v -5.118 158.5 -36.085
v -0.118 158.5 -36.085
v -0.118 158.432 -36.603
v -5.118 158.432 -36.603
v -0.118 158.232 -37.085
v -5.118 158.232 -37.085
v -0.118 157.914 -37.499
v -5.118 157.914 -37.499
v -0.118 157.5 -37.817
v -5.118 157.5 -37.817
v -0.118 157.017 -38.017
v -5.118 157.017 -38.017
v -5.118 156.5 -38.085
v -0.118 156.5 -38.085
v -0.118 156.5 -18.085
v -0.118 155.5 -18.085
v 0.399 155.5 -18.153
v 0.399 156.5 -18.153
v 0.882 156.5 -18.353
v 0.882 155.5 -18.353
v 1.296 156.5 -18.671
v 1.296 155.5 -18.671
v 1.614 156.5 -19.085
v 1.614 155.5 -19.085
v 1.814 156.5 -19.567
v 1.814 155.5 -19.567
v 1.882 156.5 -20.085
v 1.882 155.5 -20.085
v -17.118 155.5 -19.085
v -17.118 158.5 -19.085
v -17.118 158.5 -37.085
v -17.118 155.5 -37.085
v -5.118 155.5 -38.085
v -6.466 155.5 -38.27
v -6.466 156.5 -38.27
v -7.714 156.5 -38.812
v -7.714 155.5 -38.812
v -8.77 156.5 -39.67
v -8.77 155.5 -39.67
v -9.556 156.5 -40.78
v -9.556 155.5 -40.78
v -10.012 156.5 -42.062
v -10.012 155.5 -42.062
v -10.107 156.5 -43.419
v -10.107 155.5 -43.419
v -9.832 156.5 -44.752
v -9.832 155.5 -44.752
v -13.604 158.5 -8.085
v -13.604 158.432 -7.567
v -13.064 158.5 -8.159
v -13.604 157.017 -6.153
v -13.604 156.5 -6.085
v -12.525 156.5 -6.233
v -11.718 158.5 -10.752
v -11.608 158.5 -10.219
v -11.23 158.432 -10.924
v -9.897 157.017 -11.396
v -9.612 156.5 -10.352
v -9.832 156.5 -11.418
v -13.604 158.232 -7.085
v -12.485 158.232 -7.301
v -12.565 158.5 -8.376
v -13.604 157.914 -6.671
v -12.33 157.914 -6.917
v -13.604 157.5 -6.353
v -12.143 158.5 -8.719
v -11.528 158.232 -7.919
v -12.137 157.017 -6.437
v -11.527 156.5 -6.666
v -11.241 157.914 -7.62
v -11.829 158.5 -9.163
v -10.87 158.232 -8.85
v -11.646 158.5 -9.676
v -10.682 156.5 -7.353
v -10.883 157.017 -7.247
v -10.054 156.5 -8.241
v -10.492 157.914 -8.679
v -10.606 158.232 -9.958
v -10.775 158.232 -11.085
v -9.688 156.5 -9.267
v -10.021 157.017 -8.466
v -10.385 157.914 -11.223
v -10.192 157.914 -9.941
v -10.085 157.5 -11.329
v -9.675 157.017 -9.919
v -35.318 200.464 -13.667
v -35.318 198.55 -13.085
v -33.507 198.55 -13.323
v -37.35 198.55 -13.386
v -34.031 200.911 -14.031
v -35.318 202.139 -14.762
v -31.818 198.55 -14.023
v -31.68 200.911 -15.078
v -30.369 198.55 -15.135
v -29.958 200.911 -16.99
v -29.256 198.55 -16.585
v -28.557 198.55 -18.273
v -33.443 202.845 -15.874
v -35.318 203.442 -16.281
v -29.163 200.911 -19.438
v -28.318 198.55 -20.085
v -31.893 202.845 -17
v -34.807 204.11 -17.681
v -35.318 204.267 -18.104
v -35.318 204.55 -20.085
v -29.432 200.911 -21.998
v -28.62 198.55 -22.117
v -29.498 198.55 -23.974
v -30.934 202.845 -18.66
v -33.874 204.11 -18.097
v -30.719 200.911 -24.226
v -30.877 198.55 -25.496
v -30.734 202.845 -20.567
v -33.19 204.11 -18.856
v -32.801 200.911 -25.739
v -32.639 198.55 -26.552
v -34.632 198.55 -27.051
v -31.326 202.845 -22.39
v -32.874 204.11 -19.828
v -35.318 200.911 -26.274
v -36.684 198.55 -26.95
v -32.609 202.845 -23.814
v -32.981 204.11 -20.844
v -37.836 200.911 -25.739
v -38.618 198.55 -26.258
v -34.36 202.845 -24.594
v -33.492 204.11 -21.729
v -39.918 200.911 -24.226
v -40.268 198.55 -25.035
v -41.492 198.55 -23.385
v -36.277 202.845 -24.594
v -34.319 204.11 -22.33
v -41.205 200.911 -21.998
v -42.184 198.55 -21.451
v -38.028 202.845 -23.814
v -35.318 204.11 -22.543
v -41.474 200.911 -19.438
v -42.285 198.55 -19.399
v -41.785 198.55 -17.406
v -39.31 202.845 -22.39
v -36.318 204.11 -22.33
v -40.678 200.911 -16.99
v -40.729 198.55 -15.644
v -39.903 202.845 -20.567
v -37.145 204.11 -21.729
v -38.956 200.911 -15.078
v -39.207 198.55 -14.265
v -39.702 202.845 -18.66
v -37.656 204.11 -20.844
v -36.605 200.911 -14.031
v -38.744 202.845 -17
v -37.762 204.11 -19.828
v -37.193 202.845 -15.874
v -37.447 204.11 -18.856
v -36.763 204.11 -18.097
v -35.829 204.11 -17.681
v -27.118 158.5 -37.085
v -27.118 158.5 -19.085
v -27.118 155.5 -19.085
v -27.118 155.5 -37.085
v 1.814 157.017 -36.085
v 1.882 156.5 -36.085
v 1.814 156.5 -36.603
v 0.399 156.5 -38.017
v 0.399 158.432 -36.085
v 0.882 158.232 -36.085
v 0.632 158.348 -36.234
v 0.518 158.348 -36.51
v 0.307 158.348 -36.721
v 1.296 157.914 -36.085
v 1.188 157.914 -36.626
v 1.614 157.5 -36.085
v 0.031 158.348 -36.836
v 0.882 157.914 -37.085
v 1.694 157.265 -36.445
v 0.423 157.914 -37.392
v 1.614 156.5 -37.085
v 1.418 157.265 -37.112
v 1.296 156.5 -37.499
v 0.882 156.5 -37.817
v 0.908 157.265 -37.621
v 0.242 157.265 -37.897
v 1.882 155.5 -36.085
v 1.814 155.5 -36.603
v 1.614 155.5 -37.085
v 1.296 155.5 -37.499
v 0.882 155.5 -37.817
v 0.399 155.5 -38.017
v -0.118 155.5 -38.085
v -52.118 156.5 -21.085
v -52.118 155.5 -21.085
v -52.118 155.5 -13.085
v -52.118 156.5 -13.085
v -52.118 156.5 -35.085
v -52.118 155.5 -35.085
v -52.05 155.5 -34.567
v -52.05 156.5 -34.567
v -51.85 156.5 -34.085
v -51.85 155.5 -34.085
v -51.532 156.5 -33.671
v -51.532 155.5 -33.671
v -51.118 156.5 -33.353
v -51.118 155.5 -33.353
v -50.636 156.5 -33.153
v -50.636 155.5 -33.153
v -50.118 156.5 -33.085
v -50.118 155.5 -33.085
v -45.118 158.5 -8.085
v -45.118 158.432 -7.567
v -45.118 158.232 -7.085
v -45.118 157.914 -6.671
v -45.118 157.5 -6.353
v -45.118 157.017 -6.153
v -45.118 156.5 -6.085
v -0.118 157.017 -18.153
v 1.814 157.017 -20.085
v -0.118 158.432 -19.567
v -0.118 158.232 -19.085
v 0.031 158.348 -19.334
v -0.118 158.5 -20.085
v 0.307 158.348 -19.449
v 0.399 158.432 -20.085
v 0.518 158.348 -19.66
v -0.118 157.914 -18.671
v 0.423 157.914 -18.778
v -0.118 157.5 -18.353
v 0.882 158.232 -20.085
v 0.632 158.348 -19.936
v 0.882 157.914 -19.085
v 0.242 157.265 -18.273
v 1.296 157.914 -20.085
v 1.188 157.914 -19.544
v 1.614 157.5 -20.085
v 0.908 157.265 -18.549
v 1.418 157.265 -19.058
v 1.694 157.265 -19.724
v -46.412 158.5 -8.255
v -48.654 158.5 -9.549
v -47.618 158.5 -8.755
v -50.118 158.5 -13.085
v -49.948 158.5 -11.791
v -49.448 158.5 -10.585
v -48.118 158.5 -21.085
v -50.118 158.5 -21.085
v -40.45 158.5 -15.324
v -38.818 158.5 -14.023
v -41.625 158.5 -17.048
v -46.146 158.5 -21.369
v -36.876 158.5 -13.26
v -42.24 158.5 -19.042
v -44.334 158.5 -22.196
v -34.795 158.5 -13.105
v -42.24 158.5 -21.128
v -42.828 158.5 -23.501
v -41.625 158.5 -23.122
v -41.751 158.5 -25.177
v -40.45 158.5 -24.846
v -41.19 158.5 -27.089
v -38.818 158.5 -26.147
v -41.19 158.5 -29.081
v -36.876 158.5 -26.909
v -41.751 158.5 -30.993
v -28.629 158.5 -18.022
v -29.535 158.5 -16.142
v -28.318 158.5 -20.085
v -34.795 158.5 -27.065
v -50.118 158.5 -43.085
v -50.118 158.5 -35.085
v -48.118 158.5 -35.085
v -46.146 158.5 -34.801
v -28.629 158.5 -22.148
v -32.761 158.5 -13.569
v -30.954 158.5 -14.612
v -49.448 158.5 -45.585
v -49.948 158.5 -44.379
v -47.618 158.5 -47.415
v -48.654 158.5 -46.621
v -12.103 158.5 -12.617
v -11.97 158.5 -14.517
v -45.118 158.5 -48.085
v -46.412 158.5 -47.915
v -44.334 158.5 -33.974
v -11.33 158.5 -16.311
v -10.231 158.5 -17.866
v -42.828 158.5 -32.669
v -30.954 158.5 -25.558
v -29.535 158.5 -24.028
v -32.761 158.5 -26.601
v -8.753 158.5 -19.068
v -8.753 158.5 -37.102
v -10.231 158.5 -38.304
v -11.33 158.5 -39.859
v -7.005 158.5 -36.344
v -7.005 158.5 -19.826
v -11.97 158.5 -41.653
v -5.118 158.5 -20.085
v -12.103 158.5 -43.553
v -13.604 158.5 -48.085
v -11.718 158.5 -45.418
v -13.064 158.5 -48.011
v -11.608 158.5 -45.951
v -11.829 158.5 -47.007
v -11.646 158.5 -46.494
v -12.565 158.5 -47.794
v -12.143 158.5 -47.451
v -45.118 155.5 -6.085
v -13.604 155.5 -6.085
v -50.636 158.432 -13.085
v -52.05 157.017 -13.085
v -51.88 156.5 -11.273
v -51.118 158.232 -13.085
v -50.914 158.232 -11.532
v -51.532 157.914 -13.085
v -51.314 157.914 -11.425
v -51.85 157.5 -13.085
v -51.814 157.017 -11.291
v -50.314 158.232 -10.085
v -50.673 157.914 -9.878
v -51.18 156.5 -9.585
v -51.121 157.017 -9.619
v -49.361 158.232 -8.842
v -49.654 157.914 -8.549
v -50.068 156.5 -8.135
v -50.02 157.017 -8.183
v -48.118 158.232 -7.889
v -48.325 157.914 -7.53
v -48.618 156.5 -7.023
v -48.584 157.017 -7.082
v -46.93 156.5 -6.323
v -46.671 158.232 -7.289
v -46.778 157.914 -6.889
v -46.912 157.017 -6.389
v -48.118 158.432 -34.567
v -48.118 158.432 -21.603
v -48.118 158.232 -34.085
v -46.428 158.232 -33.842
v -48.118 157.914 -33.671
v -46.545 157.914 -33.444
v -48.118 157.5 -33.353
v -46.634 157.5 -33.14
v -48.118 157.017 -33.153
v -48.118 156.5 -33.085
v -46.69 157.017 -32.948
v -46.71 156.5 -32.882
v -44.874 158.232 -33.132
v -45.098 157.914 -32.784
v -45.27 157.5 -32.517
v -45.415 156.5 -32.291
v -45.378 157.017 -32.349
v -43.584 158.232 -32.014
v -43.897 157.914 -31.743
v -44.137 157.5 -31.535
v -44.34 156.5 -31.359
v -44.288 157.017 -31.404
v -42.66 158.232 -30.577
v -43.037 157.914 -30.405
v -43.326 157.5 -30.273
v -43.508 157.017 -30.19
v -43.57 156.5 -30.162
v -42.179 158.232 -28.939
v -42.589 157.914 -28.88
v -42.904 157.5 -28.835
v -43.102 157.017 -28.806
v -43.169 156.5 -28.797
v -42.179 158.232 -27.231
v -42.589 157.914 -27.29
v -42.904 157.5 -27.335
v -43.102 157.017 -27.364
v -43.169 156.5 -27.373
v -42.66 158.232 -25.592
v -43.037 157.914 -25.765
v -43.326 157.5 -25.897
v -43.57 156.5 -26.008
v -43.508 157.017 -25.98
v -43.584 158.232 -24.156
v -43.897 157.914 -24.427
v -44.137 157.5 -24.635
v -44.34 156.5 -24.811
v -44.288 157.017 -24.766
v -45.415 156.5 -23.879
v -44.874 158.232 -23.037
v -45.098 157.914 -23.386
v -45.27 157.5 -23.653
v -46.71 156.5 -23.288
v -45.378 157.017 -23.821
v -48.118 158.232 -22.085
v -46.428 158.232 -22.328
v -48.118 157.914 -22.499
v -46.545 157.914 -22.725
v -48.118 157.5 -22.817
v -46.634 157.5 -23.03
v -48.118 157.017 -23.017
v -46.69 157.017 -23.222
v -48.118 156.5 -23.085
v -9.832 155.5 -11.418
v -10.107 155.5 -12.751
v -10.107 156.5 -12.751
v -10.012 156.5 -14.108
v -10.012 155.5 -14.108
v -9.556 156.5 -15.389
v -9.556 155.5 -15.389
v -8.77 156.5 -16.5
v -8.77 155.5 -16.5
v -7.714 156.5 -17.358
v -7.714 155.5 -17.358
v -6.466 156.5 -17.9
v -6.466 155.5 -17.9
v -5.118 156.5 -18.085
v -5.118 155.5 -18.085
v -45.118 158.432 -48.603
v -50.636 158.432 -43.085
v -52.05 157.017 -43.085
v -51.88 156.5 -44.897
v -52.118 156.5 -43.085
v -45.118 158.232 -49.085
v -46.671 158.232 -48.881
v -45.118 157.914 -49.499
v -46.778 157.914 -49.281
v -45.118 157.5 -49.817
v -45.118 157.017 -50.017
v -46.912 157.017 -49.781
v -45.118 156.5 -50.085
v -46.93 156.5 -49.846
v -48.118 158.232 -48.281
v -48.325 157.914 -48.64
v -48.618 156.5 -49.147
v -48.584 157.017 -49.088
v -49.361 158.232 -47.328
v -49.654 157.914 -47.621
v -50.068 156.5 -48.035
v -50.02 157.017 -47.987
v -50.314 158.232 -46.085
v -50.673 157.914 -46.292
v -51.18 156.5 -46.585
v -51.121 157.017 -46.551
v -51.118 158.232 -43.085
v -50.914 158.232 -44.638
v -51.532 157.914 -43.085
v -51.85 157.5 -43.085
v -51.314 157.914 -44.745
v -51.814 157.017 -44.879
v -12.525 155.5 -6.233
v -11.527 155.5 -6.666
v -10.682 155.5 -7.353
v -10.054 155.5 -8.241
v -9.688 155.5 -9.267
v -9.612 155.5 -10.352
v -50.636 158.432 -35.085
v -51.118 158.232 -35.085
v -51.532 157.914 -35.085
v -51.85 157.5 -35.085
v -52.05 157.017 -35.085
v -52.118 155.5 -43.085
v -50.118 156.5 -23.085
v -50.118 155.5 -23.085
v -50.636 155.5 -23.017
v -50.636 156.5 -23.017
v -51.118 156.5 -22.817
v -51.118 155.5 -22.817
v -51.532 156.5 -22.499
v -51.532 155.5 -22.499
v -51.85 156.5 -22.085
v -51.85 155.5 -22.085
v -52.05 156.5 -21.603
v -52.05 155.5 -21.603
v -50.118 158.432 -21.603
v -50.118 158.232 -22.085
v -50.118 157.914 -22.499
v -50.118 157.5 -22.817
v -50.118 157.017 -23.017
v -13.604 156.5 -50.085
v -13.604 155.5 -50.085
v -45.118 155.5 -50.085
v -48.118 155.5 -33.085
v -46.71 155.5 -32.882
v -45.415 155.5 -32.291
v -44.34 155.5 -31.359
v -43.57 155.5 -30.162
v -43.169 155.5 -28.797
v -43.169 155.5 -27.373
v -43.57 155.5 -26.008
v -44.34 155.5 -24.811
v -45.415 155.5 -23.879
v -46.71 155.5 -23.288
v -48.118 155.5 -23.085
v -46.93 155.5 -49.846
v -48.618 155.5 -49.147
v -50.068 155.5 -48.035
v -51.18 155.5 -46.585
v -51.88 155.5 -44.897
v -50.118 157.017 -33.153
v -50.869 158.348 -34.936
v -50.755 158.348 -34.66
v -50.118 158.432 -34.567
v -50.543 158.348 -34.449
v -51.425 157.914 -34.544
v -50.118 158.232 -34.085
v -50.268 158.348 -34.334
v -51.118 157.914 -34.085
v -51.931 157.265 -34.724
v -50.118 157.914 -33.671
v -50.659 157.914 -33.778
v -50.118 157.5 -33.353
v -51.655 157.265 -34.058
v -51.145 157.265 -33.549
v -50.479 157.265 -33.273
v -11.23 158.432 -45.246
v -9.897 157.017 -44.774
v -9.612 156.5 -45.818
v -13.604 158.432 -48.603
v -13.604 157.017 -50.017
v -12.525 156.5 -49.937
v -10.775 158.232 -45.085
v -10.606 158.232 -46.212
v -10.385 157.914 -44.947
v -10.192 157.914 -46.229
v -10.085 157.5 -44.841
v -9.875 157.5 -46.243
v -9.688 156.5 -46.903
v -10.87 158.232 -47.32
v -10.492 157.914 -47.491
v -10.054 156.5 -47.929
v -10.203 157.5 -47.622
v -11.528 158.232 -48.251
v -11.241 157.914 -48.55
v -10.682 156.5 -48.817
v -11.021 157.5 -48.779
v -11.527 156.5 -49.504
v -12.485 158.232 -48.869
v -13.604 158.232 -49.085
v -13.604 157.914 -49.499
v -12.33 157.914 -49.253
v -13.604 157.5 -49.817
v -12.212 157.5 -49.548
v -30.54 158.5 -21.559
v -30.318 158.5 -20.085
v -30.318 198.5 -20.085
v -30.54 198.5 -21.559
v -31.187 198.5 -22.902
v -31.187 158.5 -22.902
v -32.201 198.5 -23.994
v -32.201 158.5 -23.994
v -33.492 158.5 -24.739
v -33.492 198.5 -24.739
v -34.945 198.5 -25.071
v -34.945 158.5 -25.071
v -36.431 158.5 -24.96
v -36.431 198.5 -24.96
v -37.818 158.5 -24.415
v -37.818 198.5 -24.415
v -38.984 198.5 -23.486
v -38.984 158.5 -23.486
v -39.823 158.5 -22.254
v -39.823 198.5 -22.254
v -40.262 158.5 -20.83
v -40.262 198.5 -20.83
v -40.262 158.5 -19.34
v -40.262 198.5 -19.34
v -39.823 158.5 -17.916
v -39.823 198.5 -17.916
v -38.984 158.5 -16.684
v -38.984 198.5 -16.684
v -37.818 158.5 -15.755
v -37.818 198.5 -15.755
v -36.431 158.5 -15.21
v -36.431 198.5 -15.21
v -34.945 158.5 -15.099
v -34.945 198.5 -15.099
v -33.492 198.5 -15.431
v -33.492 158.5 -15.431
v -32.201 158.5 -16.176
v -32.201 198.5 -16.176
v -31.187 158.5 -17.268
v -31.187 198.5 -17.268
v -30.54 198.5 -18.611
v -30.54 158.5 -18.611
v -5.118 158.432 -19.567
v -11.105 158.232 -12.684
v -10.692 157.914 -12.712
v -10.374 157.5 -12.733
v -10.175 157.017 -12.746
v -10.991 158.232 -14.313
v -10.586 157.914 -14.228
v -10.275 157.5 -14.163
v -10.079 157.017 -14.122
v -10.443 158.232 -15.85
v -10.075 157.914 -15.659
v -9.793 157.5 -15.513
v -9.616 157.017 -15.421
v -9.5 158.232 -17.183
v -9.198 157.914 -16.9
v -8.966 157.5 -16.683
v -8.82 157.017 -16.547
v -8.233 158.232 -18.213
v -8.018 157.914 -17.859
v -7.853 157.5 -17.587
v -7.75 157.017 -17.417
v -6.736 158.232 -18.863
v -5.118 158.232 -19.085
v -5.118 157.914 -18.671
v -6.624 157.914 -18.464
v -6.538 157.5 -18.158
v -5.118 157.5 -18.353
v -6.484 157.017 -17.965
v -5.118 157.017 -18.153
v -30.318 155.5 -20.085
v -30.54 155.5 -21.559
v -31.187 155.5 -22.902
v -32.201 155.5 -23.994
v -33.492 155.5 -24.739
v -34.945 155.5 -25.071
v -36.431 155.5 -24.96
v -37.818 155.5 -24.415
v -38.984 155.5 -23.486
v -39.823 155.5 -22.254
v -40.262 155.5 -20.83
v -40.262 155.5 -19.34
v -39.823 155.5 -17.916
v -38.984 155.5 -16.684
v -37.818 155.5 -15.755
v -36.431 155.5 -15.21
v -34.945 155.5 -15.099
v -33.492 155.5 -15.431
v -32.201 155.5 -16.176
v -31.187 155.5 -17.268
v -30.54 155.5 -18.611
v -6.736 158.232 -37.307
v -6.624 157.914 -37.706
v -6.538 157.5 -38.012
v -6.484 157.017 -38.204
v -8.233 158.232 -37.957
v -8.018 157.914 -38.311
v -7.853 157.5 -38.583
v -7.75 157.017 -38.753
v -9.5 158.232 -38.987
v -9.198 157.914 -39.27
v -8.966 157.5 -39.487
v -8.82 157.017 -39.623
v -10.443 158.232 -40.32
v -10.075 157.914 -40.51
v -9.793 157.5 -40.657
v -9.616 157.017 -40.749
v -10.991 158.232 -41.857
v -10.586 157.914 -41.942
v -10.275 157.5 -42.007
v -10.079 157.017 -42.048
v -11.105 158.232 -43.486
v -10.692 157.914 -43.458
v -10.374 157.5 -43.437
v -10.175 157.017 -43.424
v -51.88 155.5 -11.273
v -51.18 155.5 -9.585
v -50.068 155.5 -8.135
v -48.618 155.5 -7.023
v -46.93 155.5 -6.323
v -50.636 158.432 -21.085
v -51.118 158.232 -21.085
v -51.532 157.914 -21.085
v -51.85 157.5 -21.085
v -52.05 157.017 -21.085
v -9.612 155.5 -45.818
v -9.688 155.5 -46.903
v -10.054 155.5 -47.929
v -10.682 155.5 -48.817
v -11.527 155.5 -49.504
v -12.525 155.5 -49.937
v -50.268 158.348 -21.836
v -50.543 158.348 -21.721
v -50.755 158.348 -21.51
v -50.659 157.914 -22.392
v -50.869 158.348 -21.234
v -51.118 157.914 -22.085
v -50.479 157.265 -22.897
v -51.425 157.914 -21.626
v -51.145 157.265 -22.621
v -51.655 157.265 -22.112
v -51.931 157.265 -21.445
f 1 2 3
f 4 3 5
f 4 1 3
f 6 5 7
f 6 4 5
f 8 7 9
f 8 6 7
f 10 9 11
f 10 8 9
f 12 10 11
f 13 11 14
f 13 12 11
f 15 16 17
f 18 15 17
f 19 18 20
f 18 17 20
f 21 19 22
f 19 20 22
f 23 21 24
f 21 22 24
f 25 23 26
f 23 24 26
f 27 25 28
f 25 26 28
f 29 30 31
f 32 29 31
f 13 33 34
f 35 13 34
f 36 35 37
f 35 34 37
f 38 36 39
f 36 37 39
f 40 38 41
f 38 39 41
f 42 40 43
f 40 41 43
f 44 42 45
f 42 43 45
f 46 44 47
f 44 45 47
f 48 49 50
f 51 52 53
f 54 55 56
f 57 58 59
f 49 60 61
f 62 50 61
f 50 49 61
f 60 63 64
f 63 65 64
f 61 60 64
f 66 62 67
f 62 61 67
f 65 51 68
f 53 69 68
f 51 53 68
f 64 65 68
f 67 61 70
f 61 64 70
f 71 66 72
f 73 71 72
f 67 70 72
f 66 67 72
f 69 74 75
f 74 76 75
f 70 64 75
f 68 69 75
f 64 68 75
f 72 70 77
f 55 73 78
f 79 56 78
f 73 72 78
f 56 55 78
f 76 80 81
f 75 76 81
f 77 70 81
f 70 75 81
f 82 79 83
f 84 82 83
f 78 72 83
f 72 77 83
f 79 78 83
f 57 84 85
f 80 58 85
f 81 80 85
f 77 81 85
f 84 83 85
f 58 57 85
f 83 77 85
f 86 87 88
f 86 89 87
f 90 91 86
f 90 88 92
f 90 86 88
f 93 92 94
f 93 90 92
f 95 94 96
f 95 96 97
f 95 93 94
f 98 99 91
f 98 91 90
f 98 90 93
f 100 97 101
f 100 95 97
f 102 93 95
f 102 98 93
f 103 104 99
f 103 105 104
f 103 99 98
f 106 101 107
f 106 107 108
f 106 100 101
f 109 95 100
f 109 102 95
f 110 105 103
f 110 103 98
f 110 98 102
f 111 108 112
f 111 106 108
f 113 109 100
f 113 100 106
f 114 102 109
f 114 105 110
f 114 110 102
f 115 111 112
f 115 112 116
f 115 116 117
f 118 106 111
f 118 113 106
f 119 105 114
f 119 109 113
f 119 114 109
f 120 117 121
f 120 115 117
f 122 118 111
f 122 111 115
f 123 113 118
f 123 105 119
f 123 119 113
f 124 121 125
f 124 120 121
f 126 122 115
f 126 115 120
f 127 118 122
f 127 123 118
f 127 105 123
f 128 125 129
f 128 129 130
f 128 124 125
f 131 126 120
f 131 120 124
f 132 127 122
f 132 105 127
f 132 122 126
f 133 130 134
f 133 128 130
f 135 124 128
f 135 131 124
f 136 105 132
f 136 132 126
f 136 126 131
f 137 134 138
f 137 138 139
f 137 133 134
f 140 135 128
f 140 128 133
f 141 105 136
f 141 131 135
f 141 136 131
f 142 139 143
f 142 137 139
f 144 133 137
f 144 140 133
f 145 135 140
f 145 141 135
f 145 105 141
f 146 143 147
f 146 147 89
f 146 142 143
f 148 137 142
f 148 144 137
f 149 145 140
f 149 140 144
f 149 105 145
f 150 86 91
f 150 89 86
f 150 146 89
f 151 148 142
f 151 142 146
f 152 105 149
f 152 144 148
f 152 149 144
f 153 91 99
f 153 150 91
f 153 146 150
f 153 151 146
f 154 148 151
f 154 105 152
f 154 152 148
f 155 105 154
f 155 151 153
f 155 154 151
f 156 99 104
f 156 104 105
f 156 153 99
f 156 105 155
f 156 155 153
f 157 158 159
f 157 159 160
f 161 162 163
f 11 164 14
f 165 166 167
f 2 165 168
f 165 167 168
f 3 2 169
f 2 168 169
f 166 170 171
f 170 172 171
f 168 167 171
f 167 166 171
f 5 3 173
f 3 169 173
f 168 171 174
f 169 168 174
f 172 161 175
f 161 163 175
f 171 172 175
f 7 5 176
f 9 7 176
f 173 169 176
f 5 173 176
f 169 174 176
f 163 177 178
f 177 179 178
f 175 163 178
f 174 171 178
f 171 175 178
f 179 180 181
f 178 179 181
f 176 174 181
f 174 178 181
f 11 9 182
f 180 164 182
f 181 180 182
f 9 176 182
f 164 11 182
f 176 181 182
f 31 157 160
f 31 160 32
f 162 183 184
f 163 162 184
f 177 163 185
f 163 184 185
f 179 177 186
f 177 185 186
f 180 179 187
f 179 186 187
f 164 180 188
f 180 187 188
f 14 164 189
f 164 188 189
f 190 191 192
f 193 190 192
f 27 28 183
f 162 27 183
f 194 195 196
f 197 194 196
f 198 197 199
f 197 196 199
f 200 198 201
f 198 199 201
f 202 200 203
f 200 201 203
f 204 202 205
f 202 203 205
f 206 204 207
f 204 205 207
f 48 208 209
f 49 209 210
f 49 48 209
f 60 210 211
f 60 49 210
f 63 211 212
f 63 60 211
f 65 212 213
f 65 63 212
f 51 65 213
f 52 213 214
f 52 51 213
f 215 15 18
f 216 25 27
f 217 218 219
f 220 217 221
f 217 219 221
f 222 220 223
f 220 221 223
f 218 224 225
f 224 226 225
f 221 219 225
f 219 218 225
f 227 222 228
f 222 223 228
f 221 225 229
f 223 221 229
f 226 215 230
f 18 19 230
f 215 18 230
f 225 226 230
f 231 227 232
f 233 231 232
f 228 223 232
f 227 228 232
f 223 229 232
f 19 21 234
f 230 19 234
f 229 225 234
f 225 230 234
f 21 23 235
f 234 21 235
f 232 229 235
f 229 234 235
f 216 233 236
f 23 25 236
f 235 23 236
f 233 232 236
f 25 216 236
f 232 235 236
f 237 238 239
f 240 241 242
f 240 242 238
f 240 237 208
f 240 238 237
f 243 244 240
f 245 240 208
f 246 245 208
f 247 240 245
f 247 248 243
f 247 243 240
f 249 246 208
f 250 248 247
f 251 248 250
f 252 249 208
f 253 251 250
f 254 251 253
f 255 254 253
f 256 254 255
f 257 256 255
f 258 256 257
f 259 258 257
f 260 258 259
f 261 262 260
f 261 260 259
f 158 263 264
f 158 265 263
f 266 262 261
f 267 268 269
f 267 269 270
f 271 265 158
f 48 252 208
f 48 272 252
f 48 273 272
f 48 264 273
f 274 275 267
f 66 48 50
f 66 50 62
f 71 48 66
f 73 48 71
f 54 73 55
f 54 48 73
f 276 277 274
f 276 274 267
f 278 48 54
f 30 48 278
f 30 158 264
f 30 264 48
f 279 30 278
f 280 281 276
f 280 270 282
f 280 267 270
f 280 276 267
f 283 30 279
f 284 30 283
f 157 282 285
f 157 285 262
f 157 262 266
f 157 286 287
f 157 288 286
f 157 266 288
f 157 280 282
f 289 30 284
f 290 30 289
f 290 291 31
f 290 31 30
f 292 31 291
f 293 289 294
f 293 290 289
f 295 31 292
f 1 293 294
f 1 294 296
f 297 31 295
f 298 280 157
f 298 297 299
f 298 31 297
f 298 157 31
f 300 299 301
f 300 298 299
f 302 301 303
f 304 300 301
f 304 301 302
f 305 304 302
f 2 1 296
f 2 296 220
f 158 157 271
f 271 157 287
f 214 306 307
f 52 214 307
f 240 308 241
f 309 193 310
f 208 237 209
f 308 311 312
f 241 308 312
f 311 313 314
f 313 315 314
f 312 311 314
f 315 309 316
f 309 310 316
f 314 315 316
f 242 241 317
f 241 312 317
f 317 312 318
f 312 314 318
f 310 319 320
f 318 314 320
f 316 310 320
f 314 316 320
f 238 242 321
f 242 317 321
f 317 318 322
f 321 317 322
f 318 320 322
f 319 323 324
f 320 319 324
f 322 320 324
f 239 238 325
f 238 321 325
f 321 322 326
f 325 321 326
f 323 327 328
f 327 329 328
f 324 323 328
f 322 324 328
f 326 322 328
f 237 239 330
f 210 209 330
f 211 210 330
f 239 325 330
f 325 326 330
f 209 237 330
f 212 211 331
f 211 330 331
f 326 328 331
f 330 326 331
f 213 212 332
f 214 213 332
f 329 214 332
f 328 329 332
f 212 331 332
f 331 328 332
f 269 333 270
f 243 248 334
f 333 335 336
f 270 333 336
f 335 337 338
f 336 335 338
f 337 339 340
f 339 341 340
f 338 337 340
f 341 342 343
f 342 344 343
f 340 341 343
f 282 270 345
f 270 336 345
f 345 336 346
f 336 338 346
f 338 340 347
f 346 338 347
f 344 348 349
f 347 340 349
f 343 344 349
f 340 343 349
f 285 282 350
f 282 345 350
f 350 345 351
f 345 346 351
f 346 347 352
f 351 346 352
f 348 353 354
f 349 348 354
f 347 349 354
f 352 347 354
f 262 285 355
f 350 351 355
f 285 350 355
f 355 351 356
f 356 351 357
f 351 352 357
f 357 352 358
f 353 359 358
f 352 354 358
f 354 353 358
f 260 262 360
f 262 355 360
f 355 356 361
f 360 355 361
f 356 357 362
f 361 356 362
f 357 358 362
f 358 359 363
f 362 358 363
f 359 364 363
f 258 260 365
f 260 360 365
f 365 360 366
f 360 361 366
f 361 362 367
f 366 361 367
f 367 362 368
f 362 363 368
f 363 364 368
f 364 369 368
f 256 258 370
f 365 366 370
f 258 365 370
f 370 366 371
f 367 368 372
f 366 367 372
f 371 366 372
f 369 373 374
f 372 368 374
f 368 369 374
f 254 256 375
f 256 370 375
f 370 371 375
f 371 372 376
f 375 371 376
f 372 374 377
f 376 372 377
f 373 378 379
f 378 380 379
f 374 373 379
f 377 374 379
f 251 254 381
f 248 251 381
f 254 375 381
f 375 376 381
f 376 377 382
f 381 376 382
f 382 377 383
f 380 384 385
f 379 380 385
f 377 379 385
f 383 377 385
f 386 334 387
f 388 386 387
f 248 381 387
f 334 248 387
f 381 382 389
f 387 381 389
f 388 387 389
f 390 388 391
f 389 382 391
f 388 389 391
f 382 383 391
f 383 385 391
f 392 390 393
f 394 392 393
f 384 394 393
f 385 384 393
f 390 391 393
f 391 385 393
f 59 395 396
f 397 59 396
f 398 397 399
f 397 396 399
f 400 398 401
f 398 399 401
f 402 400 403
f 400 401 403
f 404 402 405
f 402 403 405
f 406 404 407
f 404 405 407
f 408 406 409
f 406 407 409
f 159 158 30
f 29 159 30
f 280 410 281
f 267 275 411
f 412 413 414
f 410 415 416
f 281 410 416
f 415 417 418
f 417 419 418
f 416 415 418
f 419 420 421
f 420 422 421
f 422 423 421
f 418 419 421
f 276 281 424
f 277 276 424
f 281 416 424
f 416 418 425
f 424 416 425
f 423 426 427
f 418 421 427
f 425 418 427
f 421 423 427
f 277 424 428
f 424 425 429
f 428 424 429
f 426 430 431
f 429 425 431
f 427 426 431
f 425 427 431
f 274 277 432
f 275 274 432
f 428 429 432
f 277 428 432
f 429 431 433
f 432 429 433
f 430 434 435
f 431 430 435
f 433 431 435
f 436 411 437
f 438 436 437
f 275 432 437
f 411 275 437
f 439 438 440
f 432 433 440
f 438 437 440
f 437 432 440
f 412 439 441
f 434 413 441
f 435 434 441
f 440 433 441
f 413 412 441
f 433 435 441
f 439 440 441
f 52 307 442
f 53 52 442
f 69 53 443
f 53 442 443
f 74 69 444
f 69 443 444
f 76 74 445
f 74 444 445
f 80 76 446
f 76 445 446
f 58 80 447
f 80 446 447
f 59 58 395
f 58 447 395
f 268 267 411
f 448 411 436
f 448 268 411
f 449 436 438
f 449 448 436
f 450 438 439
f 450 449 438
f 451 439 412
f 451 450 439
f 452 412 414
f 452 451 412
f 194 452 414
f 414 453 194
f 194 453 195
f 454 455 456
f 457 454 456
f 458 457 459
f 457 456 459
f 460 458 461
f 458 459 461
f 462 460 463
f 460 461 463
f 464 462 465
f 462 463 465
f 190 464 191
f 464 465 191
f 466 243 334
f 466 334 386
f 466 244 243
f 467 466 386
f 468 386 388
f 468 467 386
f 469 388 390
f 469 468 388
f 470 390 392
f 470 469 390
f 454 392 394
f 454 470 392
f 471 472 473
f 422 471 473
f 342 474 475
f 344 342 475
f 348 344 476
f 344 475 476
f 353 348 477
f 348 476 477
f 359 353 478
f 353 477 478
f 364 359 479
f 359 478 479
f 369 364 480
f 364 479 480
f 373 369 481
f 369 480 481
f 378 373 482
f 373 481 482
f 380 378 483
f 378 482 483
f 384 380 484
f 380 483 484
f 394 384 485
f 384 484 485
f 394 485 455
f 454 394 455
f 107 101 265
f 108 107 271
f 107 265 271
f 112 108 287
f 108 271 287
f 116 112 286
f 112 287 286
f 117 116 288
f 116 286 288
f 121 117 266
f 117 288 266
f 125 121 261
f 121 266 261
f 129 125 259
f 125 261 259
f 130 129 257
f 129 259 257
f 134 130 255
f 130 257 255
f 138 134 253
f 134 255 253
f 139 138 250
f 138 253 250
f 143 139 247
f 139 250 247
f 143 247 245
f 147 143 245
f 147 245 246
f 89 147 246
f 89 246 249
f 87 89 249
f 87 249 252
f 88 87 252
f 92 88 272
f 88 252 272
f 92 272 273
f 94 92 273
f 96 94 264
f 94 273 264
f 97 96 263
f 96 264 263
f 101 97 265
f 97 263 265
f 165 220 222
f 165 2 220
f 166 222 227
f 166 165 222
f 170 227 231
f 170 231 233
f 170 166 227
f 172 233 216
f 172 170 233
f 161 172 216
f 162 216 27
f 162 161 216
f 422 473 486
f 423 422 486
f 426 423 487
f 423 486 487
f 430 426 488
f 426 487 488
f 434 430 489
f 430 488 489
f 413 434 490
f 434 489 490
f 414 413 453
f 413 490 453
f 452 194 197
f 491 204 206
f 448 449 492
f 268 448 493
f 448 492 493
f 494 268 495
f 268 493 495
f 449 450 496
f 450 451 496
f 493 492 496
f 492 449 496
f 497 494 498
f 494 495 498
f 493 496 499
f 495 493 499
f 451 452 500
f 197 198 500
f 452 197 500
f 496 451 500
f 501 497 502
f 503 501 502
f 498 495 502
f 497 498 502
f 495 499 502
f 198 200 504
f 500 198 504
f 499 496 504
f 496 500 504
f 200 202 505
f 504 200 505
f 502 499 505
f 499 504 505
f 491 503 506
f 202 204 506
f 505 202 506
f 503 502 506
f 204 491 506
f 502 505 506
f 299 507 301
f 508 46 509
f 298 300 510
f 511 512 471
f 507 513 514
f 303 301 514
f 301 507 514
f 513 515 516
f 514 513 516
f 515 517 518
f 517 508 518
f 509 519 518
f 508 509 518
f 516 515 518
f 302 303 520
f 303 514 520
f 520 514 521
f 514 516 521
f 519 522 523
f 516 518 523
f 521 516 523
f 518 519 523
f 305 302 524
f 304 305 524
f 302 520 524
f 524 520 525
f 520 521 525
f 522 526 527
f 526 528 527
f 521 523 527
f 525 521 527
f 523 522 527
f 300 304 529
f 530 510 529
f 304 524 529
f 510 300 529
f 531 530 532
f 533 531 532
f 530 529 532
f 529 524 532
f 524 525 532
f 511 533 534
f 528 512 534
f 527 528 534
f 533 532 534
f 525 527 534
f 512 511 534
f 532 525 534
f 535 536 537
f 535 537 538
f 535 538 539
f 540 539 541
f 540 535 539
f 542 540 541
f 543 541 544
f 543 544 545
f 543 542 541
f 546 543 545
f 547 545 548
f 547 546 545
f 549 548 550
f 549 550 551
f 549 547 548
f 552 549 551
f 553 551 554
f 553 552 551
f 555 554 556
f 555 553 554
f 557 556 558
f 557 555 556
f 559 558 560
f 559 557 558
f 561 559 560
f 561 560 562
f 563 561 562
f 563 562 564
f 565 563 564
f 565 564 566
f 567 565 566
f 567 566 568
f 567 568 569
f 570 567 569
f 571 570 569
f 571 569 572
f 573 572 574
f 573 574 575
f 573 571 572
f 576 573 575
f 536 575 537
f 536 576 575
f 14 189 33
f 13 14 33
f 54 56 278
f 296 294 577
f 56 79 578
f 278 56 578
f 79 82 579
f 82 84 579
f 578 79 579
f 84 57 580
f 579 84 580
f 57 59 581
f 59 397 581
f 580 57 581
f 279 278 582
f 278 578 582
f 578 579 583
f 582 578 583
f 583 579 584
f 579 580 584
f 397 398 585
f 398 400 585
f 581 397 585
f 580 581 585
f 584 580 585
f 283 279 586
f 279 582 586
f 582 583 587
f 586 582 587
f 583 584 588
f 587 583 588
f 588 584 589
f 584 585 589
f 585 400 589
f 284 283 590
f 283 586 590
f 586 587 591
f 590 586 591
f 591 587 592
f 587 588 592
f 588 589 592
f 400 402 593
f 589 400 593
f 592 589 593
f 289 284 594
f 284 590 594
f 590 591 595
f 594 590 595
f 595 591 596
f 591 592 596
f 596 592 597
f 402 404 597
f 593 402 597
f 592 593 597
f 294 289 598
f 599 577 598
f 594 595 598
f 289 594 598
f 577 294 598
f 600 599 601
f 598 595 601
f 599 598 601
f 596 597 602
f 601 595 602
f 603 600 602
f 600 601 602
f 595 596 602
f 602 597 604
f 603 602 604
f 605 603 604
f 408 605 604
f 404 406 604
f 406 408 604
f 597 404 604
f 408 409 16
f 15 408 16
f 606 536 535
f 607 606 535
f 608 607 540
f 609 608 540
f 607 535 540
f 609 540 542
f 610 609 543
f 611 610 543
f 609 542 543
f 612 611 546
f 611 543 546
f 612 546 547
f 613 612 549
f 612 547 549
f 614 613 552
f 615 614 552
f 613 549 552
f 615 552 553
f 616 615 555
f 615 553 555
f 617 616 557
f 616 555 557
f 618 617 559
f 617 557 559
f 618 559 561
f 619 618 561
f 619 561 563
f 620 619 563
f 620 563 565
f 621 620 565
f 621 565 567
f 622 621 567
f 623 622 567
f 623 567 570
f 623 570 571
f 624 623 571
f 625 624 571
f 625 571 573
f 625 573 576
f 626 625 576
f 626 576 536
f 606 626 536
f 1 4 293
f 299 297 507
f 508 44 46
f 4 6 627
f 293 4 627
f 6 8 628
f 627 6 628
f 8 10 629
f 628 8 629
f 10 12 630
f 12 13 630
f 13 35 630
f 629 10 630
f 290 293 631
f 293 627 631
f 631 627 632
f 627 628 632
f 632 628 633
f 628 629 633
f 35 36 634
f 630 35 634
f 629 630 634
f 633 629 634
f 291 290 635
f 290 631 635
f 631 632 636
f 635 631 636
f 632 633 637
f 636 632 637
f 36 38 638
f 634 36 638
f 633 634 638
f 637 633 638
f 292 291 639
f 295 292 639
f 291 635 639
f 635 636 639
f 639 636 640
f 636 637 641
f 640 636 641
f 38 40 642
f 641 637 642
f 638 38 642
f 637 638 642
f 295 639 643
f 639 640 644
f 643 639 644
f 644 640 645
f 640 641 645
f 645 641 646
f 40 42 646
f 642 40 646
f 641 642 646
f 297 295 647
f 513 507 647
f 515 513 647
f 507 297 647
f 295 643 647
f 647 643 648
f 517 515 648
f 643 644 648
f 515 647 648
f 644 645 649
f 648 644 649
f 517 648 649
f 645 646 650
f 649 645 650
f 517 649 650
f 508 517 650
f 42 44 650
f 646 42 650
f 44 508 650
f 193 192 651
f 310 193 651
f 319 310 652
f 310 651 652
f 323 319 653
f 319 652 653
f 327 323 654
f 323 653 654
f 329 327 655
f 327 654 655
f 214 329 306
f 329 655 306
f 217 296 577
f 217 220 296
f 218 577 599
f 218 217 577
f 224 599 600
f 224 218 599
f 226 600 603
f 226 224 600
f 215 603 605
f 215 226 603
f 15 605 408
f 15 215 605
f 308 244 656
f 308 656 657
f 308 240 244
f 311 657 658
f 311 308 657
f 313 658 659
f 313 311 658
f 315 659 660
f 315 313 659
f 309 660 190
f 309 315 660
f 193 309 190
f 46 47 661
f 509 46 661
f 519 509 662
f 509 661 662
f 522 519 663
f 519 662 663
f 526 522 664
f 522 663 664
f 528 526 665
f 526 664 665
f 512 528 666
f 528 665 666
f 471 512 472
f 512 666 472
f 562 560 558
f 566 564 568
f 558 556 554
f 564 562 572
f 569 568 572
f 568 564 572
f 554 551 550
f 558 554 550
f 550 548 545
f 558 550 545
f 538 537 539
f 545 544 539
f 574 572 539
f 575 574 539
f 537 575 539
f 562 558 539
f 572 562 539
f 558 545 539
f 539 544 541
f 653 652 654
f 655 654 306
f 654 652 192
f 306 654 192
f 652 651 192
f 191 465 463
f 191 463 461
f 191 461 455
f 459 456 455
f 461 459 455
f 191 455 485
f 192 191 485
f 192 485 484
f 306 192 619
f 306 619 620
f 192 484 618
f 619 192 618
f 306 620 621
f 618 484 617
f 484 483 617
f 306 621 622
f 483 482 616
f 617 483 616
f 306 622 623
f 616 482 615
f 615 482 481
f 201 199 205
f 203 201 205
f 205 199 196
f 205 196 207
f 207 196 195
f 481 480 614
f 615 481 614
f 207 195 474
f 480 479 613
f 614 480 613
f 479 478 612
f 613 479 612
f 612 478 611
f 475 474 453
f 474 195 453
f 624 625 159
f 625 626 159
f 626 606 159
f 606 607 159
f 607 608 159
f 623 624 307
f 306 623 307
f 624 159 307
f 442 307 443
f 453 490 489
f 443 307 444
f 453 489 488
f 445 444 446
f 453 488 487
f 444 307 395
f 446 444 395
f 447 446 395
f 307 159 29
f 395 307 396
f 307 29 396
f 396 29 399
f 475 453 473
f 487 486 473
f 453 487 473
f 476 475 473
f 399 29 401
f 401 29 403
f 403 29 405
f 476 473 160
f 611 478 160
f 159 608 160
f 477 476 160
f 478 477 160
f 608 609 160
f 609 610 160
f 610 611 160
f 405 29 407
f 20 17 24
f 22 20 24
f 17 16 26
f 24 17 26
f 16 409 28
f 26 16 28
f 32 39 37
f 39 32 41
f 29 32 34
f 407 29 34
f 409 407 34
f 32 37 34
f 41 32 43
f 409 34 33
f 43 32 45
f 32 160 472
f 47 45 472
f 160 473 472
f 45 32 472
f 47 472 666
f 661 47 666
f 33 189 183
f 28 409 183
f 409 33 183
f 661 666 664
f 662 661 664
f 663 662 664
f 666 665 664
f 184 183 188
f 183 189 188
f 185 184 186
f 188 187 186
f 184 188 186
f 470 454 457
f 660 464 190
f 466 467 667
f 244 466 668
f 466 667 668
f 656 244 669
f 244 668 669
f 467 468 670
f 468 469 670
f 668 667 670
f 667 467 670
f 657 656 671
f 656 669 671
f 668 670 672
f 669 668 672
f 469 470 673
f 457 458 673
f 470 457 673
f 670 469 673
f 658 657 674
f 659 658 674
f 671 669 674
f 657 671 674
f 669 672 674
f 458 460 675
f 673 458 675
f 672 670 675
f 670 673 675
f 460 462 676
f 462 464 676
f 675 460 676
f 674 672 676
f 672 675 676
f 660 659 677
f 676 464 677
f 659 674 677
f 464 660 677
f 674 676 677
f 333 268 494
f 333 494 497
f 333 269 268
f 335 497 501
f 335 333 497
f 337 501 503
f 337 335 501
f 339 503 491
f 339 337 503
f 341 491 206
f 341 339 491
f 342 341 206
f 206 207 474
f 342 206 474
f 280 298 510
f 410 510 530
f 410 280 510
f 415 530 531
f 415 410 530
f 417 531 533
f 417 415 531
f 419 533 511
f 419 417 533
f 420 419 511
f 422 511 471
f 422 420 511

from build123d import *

# Parameters (mm, degrees)
SALIENTE_EXTRUIR1_DEPTH = 3
CORTAR_EXTRUIR1_REACH   = 5
CROQUIS2_W              = 10
CROQUIS2_H              = 18
CORTAR_EXTRUIR2_REACH   = 5
CROQUIS3_R              = 5
CROQUIS4_R              = 7
CROQUIS4_R_2            = 5
SALIENTE_EXTRUIR2_DEPTH = 40
CROQUIS5_R              = 7
SALIENTE_EXTRUIR3_DEPTH = 0.05
C_PULA1_FACE_RADIUS     = 7
C_PULA1_HEIGHT          = 6
REDONDEO1_R             = 2


with BuildPart() as part:
    # Croquis1 → Saliente-Extruir1 (new body)
    with BuildSketch(Plane(origin=(0, 155.4998128, 0), x_dir=(1, 0, 0), z_dir=(0, 1, 0))):
        with BuildLine():
            Line((1.881749032, 20.084971867), (1.881749032, 36.084971867))
            ThreePointArc((1.881749032, 36.084971867), (1.295962595, 37.499185429), (-0.118250968, 38.084971867))
            Line((-0.118250968, 38.084971867), (-5.118250968, 38.084971867))
            ThreePointArc((-5.118250968, 38.084971867), (-9.200733872, 40.198220521), (-9.832296176, 44.751638534))
            ThreePointArc((-9.832296176, 44.751638534), (-10.337546018, 48.394372944), (-13.603532342, 50.084971867))
            Line((-13.603532342, 50.084971867), (-45.118250968, 50.084971867))
            ThreePointArc((-45.118250968, 50.084971867), (-50.067998436, 48.034719335), (-52.118250968, 43.084971867))
            Line((-52.118250968, 43.084971867), (-52.118250968, 35.084971867))
            ThreePointArc((-52.118250968, 35.084971867), (-51.53246453, 33.670758305), (-50.118250968, 33.084971867))
            Line((-50.118250968, 33.084971867), (-48.118250968, 33.084971867))
            ThreePointArc((-48.118250968, 33.084971867), (-43.118250968, 28.084971867), (-48.118250968, 23.084971867))
            Line((-48.118250968, 23.084971867), (-50.118250968, 23.084971867))
            ThreePointArc((-50.118250968, 23.084971867), (-51.53246453, 22.499185429), (-52.118250968, 21.084971867))
            Line((-52.118250968, 21.084971867), (-52.118250968, 13.084971867))
            ThreePointArc((-52.118250968, 13.084971867), (-50.067998436, 8.135224399), (-45.118250968, 6.084971867))
            Line((-45.118250968, 6.084971867), (-13.603532342, 6.084971867))
            ThreePointArc((-13.603532342, 6.084971867), (-10.337546018, 7.77557079), (-9.832296176, 11.4183052))
            ThreePointArc((-9.832296176, 11.4183052), (-9.200733872, 15.971723213), (-5.118250968, 18.084971867))
            Line((-5.118250968, 18.084971867), (-0.118250968, 18.084971867))
            ThreePointArc((-0.118250968, 18.084971867), (1.295962595, 18.670758305), (1.881749032, 20.084971867))
        make_face()
    extrude(amount=SALIENTE_EXTRUIR1_DEPTH)

    # Croquis2 → Cortar-Extruir1 (cut, up to next)
    with BuildSketch(Plane(origin=(0, 158.4998128, 0), x_dir=(1, 0, 0), z_dir=(0, 1, 0)), mode=Mode.PRIVATE) as cortar_extruir1_sk1:
        with Locations((-22.118250968, 28.084971867)):
            Rectangle(CROQUIS2_W, CROQUIS2_H)
    cortar_extruir1_tool1 = extrude(cortar_extruir1_sk1.sketch, amount=-CORTAR_EXTRUIR1_REACH, mode=Mode.PRIVATE) & part.part
    add(cortar_extruir1_tool1.solids().sort_by_distance((-22.118251, 158.499813, -28.084972))[0], mode=Mode.SUBTRACT)

    # Croquis3 → Cortar-Extruir2 (cut, up to next)
    with BuildSketch(Plane(origin=(0, 158.4998128, 0), x_dir=(1, 0, 0), z_dir=(0, 1, 0)), mode=Mode.PRIVATE) as cortar_extruir2_sk1:
        with Locations((-35.318250968, 20.084971867)):
            Circle(CROQUIS3_R)
    cortar_extruir2_tool1 = extrude(cortar_extruir2_sk1.sketch, amount=-CORTAR_EXTRUIR2_REACH, mode=Mode.PRIVATE) & part.part
    add(cortar_extruir2_tool1.solids().sort_by_distance((-35.318251, 158.499813, -20.084972))[0], mode=Mode.SUBTRACT)

    # Croquis4 → Saliente-Extruir2 (add)
    with BuildSketch(Plane(origin=(0, 158.4998128, 0), x_dir=(1, 0, 0), z_dir=(0, 1, 0))):
        with Locations((-35.318250968, 20.084971867)):
            Circle(CROQUIS4_R)
        with Locations((-35.318250968, 20.084971867)):
            Circle(CROQUIS4_R_2, mode=Mode.SUBTRACT)
    extrude(amount=SALIENTE_EXTRUIR2_DEPTH)

    # Croquis5 → Saliente-Extruir3 (add)
    with BuildSketch(Plane(origin=(0, 198.4998128, 0), x_dir=(1, 0, 0), z_dir=(0, 1, 0))):
        with Locations((-35.318250968, 20.084971867)):
            Circle(CROQUIS5_R)
    extrude(amount=SALIENTE_EXTRUIR3_DEPTH)

    # Cúpula1: a dome of height H over a round flat face of radius A is a cap of a sphere of radius (A * A + H * H) / (2 * H)
    c_pula1_r = (C_PULA1_FACE_RADIUS * C_PULA1_FACE_RADIUS + C_PULA1_HEIGHT * C_PULA1_HEIGHT) / (2 * C_PULA1_HEIGHT)
    c_pula1_base = Plane((-35.318250968, 198.5498128, -20.084971867), z_dir=(0, 1, 0))
    with Locations(c_pula1_base.offset(C_PULA1_HEIGHT - c_pula1_r)):
        c_pula1_ball = Sphere(c_pula1_r, mode=Mode.PRIVATE)
    add(split(c_pula1_ball, bisect_by=c_pula1_base, keep=Keep.TOP, mode=Mode.PRIVATE))

    # Redondeo1
    redondeo1_edges = [part.edges().sort_by_distance(p)[0] for p in [
        (1.295962595, 158.4998128, -37.499185429),
        (-2.618250968, 158.4998128, -38.084971867),
        (-9.200733872, 158.4998128, -40.198220521),
        (-10.337546018, 158.4998128, -48.394372944),
        (-29.360891655, 158.4998128, -50.084971867),
        (-50.067998436, 158.4998128, -48.034719335),
        (-52.118250968, 158.4998128, -39.084971867),
        (-51.53246453, 158.4998128, -33.670758305),
        (-49.118250968, 158.4998128, -33.084971867),
        (-43.118250968, 158.4998128, -28.084971867),
        (1.295962595, 158.4998128, -18.670758305),
        (-49.118250968, 158.4998128, -23.084971867),
        (-51.53246453, 158.4998128, -22.499185429),
        (-52.118250968, 158.4998128, -17.084971867),
        (-50.067998436, 158.4998128, -8.135224399),
        (-29.360891655, 158.4998128, -6.084971867),
        (-10.337546018, 158.4998128, -7.77557079),
        (-9.200733872, 158.4998128, -15.971723213),
        (-2.618250968, 158.4998128, -18.084971867),
        (1.881749032, 158.4998128, -28.084971867),
    ]]
    fillet(redondeo1_edges, radius=REDONDEO1_R)


solid = part.part
